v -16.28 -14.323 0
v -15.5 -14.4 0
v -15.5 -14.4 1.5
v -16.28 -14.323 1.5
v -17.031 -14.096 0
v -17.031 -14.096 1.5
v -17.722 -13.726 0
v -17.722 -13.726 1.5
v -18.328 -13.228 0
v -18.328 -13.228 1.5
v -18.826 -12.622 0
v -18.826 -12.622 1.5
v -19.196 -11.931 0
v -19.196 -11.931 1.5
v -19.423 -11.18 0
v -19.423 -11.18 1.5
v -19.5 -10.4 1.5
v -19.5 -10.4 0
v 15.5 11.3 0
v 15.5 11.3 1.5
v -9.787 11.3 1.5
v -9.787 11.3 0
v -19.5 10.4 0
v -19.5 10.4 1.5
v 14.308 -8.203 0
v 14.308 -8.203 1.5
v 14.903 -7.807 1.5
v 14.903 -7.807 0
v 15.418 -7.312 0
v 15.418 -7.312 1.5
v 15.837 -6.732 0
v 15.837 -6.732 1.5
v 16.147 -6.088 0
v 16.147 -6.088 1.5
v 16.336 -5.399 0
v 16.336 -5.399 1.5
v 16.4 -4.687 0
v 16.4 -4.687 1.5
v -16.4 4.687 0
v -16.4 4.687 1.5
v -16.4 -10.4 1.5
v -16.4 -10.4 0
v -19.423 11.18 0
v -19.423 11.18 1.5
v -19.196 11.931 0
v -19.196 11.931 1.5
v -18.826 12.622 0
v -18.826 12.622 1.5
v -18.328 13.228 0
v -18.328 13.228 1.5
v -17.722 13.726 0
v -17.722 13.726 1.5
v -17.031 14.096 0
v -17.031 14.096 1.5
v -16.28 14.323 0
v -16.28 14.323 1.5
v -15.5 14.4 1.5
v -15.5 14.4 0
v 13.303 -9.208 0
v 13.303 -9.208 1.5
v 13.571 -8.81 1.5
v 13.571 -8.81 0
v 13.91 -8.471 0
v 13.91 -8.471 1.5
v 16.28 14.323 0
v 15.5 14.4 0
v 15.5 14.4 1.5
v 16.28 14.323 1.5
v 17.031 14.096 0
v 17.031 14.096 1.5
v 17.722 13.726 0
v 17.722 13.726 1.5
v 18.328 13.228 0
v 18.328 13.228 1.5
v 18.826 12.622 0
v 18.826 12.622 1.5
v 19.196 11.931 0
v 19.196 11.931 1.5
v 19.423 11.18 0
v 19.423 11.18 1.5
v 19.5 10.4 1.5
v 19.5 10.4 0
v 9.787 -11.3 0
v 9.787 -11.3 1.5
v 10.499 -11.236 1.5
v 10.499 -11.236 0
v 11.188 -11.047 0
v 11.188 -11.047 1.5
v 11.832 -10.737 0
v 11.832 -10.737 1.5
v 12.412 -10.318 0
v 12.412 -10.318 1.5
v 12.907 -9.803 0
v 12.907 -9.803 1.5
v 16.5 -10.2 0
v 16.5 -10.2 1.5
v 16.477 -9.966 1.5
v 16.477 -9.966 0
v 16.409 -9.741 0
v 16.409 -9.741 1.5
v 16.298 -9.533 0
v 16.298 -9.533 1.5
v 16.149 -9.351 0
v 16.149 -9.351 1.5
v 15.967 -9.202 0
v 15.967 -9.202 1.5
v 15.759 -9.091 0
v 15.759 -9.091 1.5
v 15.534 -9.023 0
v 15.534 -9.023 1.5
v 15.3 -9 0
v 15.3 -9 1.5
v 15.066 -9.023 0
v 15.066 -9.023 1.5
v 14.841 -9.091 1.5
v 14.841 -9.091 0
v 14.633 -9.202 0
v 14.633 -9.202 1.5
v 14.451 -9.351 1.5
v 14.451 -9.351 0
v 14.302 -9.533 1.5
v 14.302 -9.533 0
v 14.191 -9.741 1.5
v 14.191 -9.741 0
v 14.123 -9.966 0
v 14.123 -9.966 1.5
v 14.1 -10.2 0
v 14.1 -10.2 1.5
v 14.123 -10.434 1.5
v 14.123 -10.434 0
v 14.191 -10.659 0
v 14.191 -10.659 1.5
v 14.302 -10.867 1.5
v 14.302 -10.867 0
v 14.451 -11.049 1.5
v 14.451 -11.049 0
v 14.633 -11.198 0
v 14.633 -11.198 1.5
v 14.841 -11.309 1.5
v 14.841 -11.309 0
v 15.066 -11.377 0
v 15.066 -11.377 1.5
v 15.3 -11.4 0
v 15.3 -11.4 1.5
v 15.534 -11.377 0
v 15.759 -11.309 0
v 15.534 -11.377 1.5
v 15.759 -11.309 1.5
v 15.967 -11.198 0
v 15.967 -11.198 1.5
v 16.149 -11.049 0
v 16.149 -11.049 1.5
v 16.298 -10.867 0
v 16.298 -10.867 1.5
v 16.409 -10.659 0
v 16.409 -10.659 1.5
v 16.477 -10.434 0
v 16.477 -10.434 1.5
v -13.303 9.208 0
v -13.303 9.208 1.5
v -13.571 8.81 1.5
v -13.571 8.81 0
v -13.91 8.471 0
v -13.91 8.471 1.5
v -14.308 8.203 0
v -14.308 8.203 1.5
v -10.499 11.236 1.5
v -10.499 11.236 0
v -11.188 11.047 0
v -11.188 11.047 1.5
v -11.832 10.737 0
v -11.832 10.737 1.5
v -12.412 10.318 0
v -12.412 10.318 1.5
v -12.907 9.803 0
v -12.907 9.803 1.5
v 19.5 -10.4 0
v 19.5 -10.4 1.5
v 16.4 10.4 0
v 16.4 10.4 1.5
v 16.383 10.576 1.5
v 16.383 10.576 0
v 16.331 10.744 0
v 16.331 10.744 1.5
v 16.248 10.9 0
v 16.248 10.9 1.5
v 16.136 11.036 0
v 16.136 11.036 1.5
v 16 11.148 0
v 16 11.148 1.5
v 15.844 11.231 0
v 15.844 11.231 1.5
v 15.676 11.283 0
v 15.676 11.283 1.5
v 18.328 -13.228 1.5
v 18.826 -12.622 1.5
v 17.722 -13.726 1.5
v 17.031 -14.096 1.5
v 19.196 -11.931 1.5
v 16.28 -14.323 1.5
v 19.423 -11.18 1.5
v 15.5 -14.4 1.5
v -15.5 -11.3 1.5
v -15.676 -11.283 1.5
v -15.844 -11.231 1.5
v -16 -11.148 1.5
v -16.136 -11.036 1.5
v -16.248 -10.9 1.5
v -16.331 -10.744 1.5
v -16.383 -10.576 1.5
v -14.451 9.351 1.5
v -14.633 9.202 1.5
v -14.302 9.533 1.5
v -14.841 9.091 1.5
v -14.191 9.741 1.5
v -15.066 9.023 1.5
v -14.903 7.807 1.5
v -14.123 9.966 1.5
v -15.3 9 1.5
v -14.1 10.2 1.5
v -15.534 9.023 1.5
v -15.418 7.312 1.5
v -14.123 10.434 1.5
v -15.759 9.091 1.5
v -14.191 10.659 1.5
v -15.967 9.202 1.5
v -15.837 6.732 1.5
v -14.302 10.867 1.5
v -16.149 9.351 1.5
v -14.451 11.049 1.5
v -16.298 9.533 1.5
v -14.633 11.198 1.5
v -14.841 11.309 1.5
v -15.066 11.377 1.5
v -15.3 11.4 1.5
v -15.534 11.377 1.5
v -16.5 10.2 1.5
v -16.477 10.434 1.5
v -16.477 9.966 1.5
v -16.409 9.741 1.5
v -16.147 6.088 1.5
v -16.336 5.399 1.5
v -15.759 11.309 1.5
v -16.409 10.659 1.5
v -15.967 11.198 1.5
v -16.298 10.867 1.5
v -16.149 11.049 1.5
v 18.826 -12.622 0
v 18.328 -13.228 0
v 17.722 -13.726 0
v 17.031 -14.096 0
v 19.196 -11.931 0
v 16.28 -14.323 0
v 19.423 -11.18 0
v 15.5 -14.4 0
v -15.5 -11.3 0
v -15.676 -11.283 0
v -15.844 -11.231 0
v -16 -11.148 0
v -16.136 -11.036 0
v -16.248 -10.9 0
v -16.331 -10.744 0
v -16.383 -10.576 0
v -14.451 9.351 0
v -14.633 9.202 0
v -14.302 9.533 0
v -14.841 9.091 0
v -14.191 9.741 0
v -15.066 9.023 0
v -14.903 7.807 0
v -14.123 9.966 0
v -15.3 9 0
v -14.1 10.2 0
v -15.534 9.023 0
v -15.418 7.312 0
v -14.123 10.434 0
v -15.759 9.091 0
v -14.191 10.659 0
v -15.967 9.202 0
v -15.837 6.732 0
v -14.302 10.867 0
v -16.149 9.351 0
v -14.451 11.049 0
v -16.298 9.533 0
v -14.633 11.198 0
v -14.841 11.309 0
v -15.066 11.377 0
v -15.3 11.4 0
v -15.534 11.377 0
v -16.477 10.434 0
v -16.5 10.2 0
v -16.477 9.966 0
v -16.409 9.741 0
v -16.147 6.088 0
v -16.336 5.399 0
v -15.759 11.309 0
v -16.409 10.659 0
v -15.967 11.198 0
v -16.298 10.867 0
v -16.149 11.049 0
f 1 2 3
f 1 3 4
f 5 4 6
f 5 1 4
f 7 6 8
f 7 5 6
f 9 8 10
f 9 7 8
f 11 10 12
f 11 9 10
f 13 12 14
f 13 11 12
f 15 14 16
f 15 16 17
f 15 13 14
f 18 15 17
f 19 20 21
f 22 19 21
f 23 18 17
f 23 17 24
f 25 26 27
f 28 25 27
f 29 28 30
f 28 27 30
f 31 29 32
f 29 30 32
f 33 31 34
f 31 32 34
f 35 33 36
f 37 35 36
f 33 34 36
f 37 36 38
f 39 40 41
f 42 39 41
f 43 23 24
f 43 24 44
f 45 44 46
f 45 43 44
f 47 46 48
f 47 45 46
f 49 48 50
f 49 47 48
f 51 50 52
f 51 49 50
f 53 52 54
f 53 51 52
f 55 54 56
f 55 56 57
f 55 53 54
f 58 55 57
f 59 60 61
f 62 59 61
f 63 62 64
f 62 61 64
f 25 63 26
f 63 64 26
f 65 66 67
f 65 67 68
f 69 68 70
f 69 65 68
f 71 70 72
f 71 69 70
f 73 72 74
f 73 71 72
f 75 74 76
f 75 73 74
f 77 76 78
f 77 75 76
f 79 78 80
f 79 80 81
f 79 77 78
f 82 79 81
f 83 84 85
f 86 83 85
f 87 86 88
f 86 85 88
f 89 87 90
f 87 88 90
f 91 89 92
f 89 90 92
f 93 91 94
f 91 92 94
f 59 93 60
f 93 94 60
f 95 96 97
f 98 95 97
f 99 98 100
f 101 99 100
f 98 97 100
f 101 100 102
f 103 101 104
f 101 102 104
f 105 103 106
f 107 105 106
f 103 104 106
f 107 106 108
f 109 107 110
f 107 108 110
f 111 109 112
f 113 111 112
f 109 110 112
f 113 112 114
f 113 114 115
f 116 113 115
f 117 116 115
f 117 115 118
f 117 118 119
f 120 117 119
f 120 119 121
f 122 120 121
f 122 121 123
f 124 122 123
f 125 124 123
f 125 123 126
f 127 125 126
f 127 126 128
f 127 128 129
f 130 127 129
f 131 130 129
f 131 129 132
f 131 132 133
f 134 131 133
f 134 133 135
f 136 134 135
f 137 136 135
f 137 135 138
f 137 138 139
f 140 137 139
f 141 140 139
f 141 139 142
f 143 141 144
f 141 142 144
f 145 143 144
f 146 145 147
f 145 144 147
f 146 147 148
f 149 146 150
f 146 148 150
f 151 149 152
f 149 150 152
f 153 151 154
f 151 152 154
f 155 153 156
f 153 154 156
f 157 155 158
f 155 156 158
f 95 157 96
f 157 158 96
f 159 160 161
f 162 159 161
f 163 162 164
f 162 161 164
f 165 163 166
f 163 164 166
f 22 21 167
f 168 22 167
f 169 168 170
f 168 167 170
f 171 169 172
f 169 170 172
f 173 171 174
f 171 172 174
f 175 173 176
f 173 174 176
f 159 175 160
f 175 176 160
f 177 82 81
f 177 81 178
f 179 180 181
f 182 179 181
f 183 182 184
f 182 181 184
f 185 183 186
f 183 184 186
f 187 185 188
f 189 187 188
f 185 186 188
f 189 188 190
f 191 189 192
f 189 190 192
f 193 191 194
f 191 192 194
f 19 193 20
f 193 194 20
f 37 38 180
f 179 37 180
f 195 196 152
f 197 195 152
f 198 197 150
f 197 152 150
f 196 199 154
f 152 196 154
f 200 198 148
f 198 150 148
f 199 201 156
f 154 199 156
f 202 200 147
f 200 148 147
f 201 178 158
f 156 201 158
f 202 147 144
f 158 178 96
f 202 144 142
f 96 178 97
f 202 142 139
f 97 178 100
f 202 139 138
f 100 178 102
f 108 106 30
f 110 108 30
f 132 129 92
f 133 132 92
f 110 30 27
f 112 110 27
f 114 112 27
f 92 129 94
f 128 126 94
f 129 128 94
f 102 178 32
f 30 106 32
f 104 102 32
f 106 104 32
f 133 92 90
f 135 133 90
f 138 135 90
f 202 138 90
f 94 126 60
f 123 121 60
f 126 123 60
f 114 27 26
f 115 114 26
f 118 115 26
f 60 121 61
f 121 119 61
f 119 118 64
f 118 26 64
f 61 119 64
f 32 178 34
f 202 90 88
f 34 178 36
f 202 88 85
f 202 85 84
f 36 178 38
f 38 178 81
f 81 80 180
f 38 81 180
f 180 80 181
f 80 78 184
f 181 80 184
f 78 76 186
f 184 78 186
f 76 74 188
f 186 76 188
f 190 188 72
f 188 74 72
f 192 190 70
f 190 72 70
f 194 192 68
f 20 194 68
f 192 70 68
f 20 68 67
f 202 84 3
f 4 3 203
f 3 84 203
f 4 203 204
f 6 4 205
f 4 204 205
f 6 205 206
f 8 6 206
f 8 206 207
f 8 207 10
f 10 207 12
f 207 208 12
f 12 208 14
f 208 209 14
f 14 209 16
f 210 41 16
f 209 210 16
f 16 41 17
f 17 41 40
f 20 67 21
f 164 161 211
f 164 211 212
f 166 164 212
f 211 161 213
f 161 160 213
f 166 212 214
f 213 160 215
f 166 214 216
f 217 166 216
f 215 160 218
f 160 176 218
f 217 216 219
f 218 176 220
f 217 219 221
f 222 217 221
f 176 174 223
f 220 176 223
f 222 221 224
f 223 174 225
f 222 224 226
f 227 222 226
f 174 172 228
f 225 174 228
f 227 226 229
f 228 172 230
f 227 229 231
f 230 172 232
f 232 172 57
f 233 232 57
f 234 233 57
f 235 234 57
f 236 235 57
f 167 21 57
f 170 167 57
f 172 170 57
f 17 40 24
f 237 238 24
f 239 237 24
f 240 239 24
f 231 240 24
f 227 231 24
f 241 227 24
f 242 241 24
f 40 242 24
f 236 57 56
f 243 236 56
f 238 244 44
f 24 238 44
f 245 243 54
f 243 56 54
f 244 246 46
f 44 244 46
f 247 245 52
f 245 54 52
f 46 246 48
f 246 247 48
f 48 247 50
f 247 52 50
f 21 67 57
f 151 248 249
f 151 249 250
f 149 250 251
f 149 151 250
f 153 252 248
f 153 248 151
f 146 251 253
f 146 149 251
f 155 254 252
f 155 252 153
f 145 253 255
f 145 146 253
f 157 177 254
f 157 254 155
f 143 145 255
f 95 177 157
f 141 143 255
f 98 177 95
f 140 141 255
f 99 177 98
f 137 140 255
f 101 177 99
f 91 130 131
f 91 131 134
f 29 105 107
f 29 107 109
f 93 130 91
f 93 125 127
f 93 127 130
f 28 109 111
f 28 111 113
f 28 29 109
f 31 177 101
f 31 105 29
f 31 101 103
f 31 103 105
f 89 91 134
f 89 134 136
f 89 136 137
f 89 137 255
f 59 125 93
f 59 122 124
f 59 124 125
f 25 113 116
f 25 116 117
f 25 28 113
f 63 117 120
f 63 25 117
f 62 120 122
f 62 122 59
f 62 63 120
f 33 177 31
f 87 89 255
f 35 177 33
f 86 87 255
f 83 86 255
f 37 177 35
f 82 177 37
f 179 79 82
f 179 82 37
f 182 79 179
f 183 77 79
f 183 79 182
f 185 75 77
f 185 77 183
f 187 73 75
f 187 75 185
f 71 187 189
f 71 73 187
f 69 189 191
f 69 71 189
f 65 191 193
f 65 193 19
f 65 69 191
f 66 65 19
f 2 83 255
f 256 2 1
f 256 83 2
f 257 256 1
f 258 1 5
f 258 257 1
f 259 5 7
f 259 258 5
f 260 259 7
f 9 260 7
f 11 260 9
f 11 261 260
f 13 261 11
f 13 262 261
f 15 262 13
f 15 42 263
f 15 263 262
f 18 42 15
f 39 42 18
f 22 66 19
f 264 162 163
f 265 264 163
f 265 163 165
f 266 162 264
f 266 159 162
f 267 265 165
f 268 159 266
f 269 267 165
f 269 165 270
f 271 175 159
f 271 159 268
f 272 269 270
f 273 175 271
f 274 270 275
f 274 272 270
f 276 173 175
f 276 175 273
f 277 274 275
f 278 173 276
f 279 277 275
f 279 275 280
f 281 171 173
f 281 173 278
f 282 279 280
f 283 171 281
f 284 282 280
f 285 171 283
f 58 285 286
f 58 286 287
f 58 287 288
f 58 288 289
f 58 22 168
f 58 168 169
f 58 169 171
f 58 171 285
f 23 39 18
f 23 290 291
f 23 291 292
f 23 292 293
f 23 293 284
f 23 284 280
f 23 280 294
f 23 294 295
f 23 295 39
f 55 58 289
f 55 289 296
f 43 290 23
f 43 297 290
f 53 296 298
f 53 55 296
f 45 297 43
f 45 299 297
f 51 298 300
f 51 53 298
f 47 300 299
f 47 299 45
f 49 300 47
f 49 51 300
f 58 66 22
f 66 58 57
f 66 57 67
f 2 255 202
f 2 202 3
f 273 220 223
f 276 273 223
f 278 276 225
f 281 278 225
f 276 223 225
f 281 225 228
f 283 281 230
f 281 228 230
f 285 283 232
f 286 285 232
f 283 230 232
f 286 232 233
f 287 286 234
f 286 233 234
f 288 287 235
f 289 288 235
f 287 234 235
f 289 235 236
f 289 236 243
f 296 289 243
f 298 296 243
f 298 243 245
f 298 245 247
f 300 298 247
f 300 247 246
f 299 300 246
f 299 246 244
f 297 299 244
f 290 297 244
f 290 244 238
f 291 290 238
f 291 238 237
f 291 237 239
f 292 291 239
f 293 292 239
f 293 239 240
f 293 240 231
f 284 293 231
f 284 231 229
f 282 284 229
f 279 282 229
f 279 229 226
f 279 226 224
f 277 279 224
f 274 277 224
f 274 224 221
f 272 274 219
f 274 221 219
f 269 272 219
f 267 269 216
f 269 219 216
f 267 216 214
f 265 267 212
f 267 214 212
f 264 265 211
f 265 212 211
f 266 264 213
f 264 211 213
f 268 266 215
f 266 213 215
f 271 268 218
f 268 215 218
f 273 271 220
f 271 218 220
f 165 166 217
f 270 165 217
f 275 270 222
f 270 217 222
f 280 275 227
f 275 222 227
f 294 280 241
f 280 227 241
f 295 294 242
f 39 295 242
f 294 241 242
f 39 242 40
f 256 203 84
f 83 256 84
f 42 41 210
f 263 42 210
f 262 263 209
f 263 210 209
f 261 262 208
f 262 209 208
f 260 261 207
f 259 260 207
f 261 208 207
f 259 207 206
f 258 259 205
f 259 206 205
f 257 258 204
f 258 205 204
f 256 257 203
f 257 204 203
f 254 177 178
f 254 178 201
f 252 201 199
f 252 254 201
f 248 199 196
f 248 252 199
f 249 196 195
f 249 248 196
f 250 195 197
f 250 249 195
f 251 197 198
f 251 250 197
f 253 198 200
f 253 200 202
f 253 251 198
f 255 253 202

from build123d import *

# Parameters (mm, degrees)
AUFSATZ_LINEAR_AUSTRAGEN1_DEPTH = 1.5
SCHNITT_LINEAR_AUSTRAGEN3_DEPTH = 25.287033578
SKIZZE8_R                       = 1.2
SCHNITT_LINEAR_AUSTRAGEN4_DEPTH = 25.287033578


with BuildPart() as part:
    # Skizze1 → Aufsatz-Linear austragen1 (new body)
    with BuildSketch(Plane.XY):
        with BuildLine():
            Line((15.5, -14.4), (-15.5, -14.4))
            ThreePointArc((-15.5, -14.4), (-18.328427125, -13.228427125), (-19.5, -10.4))
            Line((-19.5, -10.4), (-19.5, 10.4))
            ThreePointArc((-19.5, 10.4), (-18.328427125, 13.228427125), (-15.5, 14.4))
            Line((-15.5, 14.4), (15.5, 14.4))
            ThreePointArc((15.5, 14.4), (18.328427125, 13.228427125), (19.5, 10.4))
            Line((19.5, 10.4), (19.5, -10.4))
            ThreePointArc((19.5, -10.4), (18.328427125, -13.228427125), (15.5, -14.4))
        make_face()
    extrude(amount=AUFSATZ_LINEAR_AUSTRAGEN1_DEPTH)

    # Skizze2 → Schnitt-Linear austragen3 (cut, through all)
    with BuildSketch(Plane.XY.offset(1.5)):
        with BuildLine():
            Line((15.5, 11.3), (-9.786857257, 11.3))
            ThreePointArc((-9.786857257, 11.3), (-11.832490505, 10.737351395), (-13.302637407, 9.207692308))
            ThreePointArc((-13.302637407, 9.207692308), (-13.732233047, 8.632233047), (-14.307692308, 8.202637407))
            ThreePointArc((-14.307692308, 8.202637407), (-15.837351395, 6.732490505), (-16.4, 4.686857257))
            Line((-16.4, 4.686857257), (-16.4, -10.4))
            ThreePointArc((-16.4, -10.4), (-16.136396103, -11.036396103), (-15.5, -11.3))
            Line((-15.5, -11.3), (9.786857257, -11.3))
            ThreePointArc((9.786857257, -11.3), (11.832490505, -10.737351395), (13.302637407, -9.207692308))
            ThreePointArc((13.302637407, -9.207692308), (13.732233047, -8.632233047), (14.307692308, -8.202637407))
            ThreePointArc((14.307692308, -8.202637407), (15.837351395, -6.732490505), (16.4, -4.686857257))
            Line((16.4, -4.686857257), (16.4, 10.4))
            ThreePointArc((16.4, 10.4), (16.136396103, 11.036396103), (15.5, 11.3))
        make_face()
    extrude(amount=-SCHNITT_LINEAR_AUSTRAGEN3_DEPTH, mode=Mode.SUBTRACT)

    # Skizze8 → Schnitt-Linear austragen4 (cut, through all)
    with BuildSketch(Plane.XY.offset(1.5)):
        with Locations((-15.3, 10.2)):
            Circle(SKIZZE8_R)
        with Locations((15.3, -10.2)):
            Circle(SKIZZE8_R)
    extrude(amount=-SCHNITT_LINEAR_AUSTRAGEN4_DEPTH, mode=Mode.SUBTRACT)


solid = part.part
